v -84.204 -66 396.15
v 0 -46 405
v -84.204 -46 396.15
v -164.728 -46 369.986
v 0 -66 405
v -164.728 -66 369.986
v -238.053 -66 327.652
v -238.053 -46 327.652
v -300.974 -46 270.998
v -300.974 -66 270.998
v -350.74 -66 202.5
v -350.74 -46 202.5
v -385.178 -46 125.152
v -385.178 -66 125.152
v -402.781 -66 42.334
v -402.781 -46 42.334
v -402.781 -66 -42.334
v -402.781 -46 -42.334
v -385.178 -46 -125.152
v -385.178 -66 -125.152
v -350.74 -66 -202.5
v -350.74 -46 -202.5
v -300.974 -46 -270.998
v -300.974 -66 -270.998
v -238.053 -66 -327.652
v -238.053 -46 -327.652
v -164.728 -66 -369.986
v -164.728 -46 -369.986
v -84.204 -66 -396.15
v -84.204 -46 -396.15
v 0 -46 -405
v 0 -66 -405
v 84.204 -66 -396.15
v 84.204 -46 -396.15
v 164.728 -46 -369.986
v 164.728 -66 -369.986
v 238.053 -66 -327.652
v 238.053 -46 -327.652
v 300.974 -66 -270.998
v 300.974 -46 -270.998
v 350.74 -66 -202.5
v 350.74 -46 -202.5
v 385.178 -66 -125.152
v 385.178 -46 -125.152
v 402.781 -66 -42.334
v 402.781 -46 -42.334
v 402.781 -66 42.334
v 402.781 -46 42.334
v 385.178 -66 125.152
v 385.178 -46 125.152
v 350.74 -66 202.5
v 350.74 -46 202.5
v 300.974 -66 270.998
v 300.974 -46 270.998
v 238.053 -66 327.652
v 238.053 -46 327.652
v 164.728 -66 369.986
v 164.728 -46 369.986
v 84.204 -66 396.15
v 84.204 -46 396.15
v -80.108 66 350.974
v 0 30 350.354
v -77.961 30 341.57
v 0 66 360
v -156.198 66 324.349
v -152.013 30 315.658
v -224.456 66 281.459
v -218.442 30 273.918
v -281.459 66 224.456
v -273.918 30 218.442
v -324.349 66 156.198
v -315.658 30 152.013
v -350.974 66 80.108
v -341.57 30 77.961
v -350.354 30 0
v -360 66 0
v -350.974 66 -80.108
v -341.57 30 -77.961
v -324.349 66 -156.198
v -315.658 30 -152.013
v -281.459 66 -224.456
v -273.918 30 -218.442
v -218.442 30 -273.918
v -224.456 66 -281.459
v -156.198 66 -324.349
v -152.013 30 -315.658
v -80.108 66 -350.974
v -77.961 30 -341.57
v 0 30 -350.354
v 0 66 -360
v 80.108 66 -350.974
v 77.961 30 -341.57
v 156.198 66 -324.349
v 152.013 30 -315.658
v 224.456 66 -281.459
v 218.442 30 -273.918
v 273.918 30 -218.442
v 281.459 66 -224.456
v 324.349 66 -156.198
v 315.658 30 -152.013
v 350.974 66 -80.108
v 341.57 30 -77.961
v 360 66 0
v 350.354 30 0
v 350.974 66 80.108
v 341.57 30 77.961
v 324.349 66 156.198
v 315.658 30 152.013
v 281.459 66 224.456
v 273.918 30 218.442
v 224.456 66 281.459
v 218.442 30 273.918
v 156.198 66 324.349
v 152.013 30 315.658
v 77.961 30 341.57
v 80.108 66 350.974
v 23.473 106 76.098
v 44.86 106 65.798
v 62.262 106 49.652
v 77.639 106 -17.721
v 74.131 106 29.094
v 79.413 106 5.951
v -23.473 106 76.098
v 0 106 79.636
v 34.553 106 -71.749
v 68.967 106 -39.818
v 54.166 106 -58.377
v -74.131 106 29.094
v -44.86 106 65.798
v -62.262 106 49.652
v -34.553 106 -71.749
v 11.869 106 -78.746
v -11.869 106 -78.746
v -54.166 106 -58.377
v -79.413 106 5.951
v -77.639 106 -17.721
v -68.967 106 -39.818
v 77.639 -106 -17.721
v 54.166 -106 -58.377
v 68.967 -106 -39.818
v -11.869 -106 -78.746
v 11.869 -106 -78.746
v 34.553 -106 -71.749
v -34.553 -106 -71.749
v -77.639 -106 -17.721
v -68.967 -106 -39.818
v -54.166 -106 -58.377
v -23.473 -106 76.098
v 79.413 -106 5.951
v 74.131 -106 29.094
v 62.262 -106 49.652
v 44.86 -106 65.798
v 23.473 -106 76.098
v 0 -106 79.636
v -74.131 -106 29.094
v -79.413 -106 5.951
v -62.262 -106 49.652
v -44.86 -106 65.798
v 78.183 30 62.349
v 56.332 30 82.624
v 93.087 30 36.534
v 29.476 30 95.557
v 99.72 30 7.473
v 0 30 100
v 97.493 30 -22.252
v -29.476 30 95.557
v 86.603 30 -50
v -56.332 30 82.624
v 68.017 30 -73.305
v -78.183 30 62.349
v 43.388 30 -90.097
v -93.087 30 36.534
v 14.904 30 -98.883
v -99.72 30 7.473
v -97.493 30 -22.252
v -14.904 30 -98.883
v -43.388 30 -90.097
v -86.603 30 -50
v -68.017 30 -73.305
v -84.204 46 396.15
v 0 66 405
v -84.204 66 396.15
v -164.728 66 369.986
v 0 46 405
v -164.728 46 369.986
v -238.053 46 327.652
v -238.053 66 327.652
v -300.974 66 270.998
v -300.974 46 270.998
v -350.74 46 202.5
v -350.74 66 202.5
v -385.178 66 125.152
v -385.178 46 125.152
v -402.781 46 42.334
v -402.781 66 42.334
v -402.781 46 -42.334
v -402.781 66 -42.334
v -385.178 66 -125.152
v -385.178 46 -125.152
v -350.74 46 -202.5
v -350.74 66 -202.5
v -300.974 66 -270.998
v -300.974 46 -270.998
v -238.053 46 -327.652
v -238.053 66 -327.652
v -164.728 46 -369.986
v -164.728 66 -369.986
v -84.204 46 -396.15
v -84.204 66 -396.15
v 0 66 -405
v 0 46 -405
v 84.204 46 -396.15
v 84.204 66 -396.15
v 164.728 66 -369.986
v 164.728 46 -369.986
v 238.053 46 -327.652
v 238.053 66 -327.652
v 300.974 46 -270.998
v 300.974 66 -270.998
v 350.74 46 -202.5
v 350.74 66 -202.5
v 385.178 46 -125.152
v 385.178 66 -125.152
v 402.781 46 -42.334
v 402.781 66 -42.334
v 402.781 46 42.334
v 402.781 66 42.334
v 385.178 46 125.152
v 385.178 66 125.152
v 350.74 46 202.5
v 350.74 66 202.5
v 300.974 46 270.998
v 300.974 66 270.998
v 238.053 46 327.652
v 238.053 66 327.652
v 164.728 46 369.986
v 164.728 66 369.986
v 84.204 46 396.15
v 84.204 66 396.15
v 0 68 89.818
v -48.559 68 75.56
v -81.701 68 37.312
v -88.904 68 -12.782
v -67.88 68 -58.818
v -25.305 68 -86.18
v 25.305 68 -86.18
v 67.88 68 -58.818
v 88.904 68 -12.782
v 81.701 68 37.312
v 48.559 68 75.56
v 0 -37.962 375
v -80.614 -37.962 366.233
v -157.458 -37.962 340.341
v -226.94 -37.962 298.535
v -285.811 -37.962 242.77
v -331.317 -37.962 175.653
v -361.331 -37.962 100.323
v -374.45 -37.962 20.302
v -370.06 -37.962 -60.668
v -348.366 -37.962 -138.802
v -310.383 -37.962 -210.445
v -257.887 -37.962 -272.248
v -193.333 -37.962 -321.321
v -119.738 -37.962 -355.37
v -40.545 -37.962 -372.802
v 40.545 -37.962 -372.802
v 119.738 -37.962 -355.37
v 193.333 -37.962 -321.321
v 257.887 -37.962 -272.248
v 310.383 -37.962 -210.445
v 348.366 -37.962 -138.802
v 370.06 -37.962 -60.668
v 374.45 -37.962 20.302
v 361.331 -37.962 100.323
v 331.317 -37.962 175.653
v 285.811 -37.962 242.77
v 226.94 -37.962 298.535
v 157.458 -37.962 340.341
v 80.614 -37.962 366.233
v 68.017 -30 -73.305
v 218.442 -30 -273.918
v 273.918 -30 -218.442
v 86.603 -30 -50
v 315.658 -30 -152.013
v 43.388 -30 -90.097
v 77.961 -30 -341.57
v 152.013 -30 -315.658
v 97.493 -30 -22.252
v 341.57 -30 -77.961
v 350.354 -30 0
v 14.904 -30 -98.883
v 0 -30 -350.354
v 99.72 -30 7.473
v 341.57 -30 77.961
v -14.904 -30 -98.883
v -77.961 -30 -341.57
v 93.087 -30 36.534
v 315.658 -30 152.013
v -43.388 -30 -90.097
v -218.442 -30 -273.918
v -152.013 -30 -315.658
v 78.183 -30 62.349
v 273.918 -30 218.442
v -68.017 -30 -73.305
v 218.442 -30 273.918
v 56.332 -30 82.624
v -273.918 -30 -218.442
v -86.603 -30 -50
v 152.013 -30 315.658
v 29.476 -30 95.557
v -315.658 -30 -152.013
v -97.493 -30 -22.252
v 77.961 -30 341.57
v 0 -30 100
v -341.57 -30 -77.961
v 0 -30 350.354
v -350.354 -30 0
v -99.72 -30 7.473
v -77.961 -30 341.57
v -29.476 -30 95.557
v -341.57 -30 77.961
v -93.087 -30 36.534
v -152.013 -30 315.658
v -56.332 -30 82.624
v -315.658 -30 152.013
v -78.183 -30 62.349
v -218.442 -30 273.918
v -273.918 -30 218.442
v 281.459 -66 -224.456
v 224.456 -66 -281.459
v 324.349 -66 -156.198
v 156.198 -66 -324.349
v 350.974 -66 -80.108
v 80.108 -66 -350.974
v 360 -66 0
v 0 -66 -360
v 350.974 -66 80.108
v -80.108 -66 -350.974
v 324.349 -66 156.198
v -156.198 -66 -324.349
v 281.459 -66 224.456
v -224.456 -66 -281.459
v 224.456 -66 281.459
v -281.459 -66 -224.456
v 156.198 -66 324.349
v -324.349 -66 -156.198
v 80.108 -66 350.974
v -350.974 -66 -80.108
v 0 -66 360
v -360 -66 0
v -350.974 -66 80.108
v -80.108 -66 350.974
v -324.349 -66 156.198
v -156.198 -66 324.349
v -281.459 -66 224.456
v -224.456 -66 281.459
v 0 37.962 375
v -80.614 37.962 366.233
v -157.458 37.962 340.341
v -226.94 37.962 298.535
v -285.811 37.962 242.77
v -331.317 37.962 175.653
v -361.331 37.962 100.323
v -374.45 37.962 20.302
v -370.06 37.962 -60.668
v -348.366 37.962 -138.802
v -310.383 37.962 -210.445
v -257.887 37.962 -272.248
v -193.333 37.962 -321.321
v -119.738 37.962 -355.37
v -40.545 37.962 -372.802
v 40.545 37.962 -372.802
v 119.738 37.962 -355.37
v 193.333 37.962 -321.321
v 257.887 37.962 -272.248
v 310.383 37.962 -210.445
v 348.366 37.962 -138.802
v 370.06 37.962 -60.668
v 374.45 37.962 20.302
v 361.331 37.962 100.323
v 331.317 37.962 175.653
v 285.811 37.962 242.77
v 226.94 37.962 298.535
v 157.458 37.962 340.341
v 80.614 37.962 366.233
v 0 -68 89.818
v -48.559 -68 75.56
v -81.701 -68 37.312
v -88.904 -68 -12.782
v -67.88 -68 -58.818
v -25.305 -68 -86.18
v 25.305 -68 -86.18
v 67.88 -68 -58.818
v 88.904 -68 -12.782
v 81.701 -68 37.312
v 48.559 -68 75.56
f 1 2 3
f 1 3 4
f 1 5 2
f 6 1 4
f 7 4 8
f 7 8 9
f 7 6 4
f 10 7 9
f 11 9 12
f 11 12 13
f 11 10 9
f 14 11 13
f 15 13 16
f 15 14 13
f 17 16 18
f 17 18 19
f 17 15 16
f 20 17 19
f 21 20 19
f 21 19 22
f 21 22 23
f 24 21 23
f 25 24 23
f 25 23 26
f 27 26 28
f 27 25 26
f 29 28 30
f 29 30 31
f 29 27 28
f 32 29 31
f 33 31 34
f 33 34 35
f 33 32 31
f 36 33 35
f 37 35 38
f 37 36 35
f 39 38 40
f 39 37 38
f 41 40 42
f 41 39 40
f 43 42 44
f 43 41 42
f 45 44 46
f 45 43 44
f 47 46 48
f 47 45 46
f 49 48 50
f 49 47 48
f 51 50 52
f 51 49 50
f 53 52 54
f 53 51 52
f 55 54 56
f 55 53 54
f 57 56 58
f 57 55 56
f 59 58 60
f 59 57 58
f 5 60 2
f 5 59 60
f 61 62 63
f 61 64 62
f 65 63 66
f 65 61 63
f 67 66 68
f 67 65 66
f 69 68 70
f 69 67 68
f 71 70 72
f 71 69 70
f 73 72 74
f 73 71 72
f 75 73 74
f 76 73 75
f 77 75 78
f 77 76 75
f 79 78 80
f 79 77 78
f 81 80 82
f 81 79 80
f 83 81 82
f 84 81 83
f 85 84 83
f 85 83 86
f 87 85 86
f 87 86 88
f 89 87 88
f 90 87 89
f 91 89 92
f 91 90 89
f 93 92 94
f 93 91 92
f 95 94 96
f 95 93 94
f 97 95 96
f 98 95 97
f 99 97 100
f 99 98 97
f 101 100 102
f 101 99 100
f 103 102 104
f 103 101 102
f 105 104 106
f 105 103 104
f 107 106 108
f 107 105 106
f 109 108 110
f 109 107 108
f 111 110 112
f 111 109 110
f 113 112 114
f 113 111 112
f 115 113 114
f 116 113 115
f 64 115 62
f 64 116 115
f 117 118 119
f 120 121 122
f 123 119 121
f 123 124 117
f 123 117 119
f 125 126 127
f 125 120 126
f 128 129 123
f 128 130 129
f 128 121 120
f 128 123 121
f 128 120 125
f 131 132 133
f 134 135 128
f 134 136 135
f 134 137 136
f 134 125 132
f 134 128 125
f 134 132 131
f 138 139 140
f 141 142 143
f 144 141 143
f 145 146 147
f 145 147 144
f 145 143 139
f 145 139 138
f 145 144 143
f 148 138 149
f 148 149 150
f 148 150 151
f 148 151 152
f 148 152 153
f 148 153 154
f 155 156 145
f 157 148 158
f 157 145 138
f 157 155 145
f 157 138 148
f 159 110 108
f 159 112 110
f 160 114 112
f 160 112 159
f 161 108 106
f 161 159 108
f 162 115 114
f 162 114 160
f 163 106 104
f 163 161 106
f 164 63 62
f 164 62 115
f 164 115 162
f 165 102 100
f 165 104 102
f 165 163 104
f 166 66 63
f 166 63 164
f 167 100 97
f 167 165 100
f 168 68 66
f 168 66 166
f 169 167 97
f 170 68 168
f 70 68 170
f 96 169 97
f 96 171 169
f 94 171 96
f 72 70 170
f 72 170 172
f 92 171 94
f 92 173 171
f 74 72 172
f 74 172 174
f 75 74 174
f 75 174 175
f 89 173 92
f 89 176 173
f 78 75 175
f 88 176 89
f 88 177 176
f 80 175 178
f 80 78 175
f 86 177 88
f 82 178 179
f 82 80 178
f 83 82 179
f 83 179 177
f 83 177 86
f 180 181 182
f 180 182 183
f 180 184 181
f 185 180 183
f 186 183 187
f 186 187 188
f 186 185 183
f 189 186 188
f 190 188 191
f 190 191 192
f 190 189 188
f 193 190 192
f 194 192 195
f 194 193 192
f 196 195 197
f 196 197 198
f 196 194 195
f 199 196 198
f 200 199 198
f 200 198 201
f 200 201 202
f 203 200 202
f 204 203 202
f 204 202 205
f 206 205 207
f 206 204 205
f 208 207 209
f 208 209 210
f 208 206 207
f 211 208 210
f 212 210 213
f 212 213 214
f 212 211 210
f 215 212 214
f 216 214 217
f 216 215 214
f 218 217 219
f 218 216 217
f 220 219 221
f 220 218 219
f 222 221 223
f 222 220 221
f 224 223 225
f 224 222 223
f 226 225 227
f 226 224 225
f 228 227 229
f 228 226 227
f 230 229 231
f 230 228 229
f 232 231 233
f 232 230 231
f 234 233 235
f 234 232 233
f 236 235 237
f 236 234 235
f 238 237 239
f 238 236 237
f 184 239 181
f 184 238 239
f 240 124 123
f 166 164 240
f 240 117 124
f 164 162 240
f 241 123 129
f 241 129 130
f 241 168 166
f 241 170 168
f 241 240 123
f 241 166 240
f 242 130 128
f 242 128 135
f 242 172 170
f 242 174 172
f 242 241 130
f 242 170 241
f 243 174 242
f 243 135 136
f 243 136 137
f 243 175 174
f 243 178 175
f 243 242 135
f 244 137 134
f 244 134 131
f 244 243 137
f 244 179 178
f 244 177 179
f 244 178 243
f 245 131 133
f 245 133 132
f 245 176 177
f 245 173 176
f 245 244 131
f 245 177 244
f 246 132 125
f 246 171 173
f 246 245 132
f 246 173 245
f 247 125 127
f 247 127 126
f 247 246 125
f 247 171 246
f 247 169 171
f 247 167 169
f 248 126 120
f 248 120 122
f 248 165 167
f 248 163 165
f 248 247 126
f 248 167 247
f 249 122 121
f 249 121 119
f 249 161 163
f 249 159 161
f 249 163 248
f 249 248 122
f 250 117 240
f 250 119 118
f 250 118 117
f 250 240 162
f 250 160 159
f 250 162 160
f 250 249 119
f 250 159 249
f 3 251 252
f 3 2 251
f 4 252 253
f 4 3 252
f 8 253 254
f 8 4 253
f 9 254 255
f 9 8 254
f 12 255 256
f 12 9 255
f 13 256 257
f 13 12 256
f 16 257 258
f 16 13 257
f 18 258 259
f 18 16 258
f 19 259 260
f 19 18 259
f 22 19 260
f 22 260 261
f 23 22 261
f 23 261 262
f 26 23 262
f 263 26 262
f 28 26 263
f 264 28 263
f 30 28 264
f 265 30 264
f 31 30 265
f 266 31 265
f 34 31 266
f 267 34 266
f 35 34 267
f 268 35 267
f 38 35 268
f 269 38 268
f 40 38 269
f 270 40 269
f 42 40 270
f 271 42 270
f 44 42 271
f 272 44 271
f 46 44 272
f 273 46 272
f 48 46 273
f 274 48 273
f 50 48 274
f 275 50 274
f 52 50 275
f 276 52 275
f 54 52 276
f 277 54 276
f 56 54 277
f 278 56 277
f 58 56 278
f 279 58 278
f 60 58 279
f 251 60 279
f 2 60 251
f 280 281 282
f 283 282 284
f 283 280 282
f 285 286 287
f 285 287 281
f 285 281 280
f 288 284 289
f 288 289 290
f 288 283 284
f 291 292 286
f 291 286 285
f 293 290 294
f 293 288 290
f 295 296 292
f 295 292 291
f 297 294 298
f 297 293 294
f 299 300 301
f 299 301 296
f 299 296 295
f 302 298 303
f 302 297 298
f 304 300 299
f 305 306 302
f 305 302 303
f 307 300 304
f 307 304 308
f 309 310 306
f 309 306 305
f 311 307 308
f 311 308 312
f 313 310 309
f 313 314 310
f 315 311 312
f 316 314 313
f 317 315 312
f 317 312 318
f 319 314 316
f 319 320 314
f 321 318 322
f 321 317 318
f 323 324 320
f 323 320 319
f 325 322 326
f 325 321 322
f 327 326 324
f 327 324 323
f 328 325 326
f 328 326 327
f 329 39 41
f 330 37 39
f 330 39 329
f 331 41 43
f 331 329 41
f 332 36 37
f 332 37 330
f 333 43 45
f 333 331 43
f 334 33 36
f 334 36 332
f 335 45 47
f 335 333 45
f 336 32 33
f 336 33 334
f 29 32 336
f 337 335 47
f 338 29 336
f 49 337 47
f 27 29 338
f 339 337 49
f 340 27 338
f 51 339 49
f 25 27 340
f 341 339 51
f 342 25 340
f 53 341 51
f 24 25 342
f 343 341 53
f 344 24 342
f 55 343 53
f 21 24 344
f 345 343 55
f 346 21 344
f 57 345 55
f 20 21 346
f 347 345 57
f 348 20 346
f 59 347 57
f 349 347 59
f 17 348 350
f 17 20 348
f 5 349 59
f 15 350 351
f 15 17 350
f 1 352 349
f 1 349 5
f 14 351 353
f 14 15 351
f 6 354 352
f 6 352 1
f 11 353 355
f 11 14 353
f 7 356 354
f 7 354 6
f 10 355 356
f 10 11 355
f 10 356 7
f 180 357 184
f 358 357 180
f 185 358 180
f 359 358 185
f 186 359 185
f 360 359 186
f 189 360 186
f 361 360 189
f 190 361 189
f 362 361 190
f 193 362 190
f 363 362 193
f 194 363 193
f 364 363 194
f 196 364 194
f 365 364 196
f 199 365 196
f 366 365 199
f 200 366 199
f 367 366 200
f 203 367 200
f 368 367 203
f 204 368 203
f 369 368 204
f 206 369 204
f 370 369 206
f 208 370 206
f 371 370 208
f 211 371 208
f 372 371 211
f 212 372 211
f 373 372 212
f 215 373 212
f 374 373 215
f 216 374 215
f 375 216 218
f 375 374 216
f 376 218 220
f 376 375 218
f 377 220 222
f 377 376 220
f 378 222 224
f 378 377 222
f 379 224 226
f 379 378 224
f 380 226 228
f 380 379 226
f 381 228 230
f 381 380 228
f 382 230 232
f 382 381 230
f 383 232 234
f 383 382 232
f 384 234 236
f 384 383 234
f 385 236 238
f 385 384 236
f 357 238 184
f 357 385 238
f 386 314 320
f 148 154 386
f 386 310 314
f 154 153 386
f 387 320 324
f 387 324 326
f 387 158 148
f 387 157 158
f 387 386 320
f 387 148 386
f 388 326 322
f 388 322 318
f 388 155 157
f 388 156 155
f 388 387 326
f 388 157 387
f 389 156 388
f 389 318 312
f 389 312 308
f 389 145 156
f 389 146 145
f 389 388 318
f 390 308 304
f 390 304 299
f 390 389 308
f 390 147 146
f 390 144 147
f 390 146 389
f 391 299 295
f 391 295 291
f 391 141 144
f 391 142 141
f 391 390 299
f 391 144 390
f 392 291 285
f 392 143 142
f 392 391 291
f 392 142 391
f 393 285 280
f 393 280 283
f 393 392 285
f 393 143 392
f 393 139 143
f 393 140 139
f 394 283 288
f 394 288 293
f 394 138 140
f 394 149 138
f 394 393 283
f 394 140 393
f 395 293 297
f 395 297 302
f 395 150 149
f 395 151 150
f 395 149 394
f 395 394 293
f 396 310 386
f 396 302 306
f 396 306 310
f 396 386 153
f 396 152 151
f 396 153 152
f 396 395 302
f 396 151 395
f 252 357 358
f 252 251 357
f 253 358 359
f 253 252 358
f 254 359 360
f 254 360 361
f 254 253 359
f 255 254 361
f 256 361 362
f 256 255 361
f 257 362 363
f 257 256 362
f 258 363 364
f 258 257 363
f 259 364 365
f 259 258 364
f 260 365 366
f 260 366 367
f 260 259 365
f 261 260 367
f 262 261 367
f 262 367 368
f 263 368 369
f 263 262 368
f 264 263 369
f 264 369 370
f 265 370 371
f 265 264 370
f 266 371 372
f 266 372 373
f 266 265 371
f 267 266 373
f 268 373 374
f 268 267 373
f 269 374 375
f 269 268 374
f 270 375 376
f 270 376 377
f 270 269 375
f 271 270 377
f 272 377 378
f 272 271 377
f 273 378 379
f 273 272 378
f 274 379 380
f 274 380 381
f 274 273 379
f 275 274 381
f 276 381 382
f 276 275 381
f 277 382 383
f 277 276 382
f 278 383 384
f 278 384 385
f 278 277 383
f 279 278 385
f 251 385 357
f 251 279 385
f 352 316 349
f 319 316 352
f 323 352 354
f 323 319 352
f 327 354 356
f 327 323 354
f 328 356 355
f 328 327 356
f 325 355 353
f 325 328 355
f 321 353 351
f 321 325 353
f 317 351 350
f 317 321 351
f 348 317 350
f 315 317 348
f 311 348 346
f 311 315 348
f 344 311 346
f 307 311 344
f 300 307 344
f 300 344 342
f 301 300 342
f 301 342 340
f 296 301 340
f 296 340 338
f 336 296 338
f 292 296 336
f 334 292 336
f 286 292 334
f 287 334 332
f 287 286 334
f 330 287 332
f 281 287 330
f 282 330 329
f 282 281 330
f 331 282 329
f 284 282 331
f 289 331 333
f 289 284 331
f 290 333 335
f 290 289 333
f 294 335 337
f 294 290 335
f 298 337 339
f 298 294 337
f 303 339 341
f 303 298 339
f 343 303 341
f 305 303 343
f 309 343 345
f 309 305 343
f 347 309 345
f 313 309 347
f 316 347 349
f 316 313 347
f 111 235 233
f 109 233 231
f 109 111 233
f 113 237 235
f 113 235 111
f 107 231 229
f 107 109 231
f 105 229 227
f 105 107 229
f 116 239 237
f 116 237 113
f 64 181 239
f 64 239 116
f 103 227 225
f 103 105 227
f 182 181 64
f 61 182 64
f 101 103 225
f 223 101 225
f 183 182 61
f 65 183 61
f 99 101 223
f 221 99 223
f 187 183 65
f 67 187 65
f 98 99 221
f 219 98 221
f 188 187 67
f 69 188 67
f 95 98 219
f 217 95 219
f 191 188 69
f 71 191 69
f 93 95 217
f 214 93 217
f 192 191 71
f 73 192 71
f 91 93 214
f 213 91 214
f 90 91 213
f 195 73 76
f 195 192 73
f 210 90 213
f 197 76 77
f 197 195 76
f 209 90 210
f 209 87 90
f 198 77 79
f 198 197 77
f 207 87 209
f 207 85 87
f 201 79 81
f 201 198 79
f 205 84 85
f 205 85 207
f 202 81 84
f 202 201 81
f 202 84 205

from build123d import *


with BuildPart() as f2:
    # F1 (on Right) → F2 (revolve)
    with BuildSketch(Plane.YZ):
        Polygon((-30, 0), (30, 0), (30, 100), (30, 350.3538290725), (66, 360), (66, 405), (46, 405), (37.9615242271, 375), (0, 375), (-37.9615242271, 375), (-46, 405), (-66, 405), (-66, 360), (-30, 350.3538290725), (-30, 100), align=None)
        Polygon((30, 100), (30, 0), (106, 0), (106, 79.6358613752), align=None)
        Polygon((-106, 0), (-30, 0), (-30, 100), (-106, 79.6358613752), align=None)
    revolve(axis=Axis((0, 0, 0), (0, -1, 0)))


solid = f2.part
